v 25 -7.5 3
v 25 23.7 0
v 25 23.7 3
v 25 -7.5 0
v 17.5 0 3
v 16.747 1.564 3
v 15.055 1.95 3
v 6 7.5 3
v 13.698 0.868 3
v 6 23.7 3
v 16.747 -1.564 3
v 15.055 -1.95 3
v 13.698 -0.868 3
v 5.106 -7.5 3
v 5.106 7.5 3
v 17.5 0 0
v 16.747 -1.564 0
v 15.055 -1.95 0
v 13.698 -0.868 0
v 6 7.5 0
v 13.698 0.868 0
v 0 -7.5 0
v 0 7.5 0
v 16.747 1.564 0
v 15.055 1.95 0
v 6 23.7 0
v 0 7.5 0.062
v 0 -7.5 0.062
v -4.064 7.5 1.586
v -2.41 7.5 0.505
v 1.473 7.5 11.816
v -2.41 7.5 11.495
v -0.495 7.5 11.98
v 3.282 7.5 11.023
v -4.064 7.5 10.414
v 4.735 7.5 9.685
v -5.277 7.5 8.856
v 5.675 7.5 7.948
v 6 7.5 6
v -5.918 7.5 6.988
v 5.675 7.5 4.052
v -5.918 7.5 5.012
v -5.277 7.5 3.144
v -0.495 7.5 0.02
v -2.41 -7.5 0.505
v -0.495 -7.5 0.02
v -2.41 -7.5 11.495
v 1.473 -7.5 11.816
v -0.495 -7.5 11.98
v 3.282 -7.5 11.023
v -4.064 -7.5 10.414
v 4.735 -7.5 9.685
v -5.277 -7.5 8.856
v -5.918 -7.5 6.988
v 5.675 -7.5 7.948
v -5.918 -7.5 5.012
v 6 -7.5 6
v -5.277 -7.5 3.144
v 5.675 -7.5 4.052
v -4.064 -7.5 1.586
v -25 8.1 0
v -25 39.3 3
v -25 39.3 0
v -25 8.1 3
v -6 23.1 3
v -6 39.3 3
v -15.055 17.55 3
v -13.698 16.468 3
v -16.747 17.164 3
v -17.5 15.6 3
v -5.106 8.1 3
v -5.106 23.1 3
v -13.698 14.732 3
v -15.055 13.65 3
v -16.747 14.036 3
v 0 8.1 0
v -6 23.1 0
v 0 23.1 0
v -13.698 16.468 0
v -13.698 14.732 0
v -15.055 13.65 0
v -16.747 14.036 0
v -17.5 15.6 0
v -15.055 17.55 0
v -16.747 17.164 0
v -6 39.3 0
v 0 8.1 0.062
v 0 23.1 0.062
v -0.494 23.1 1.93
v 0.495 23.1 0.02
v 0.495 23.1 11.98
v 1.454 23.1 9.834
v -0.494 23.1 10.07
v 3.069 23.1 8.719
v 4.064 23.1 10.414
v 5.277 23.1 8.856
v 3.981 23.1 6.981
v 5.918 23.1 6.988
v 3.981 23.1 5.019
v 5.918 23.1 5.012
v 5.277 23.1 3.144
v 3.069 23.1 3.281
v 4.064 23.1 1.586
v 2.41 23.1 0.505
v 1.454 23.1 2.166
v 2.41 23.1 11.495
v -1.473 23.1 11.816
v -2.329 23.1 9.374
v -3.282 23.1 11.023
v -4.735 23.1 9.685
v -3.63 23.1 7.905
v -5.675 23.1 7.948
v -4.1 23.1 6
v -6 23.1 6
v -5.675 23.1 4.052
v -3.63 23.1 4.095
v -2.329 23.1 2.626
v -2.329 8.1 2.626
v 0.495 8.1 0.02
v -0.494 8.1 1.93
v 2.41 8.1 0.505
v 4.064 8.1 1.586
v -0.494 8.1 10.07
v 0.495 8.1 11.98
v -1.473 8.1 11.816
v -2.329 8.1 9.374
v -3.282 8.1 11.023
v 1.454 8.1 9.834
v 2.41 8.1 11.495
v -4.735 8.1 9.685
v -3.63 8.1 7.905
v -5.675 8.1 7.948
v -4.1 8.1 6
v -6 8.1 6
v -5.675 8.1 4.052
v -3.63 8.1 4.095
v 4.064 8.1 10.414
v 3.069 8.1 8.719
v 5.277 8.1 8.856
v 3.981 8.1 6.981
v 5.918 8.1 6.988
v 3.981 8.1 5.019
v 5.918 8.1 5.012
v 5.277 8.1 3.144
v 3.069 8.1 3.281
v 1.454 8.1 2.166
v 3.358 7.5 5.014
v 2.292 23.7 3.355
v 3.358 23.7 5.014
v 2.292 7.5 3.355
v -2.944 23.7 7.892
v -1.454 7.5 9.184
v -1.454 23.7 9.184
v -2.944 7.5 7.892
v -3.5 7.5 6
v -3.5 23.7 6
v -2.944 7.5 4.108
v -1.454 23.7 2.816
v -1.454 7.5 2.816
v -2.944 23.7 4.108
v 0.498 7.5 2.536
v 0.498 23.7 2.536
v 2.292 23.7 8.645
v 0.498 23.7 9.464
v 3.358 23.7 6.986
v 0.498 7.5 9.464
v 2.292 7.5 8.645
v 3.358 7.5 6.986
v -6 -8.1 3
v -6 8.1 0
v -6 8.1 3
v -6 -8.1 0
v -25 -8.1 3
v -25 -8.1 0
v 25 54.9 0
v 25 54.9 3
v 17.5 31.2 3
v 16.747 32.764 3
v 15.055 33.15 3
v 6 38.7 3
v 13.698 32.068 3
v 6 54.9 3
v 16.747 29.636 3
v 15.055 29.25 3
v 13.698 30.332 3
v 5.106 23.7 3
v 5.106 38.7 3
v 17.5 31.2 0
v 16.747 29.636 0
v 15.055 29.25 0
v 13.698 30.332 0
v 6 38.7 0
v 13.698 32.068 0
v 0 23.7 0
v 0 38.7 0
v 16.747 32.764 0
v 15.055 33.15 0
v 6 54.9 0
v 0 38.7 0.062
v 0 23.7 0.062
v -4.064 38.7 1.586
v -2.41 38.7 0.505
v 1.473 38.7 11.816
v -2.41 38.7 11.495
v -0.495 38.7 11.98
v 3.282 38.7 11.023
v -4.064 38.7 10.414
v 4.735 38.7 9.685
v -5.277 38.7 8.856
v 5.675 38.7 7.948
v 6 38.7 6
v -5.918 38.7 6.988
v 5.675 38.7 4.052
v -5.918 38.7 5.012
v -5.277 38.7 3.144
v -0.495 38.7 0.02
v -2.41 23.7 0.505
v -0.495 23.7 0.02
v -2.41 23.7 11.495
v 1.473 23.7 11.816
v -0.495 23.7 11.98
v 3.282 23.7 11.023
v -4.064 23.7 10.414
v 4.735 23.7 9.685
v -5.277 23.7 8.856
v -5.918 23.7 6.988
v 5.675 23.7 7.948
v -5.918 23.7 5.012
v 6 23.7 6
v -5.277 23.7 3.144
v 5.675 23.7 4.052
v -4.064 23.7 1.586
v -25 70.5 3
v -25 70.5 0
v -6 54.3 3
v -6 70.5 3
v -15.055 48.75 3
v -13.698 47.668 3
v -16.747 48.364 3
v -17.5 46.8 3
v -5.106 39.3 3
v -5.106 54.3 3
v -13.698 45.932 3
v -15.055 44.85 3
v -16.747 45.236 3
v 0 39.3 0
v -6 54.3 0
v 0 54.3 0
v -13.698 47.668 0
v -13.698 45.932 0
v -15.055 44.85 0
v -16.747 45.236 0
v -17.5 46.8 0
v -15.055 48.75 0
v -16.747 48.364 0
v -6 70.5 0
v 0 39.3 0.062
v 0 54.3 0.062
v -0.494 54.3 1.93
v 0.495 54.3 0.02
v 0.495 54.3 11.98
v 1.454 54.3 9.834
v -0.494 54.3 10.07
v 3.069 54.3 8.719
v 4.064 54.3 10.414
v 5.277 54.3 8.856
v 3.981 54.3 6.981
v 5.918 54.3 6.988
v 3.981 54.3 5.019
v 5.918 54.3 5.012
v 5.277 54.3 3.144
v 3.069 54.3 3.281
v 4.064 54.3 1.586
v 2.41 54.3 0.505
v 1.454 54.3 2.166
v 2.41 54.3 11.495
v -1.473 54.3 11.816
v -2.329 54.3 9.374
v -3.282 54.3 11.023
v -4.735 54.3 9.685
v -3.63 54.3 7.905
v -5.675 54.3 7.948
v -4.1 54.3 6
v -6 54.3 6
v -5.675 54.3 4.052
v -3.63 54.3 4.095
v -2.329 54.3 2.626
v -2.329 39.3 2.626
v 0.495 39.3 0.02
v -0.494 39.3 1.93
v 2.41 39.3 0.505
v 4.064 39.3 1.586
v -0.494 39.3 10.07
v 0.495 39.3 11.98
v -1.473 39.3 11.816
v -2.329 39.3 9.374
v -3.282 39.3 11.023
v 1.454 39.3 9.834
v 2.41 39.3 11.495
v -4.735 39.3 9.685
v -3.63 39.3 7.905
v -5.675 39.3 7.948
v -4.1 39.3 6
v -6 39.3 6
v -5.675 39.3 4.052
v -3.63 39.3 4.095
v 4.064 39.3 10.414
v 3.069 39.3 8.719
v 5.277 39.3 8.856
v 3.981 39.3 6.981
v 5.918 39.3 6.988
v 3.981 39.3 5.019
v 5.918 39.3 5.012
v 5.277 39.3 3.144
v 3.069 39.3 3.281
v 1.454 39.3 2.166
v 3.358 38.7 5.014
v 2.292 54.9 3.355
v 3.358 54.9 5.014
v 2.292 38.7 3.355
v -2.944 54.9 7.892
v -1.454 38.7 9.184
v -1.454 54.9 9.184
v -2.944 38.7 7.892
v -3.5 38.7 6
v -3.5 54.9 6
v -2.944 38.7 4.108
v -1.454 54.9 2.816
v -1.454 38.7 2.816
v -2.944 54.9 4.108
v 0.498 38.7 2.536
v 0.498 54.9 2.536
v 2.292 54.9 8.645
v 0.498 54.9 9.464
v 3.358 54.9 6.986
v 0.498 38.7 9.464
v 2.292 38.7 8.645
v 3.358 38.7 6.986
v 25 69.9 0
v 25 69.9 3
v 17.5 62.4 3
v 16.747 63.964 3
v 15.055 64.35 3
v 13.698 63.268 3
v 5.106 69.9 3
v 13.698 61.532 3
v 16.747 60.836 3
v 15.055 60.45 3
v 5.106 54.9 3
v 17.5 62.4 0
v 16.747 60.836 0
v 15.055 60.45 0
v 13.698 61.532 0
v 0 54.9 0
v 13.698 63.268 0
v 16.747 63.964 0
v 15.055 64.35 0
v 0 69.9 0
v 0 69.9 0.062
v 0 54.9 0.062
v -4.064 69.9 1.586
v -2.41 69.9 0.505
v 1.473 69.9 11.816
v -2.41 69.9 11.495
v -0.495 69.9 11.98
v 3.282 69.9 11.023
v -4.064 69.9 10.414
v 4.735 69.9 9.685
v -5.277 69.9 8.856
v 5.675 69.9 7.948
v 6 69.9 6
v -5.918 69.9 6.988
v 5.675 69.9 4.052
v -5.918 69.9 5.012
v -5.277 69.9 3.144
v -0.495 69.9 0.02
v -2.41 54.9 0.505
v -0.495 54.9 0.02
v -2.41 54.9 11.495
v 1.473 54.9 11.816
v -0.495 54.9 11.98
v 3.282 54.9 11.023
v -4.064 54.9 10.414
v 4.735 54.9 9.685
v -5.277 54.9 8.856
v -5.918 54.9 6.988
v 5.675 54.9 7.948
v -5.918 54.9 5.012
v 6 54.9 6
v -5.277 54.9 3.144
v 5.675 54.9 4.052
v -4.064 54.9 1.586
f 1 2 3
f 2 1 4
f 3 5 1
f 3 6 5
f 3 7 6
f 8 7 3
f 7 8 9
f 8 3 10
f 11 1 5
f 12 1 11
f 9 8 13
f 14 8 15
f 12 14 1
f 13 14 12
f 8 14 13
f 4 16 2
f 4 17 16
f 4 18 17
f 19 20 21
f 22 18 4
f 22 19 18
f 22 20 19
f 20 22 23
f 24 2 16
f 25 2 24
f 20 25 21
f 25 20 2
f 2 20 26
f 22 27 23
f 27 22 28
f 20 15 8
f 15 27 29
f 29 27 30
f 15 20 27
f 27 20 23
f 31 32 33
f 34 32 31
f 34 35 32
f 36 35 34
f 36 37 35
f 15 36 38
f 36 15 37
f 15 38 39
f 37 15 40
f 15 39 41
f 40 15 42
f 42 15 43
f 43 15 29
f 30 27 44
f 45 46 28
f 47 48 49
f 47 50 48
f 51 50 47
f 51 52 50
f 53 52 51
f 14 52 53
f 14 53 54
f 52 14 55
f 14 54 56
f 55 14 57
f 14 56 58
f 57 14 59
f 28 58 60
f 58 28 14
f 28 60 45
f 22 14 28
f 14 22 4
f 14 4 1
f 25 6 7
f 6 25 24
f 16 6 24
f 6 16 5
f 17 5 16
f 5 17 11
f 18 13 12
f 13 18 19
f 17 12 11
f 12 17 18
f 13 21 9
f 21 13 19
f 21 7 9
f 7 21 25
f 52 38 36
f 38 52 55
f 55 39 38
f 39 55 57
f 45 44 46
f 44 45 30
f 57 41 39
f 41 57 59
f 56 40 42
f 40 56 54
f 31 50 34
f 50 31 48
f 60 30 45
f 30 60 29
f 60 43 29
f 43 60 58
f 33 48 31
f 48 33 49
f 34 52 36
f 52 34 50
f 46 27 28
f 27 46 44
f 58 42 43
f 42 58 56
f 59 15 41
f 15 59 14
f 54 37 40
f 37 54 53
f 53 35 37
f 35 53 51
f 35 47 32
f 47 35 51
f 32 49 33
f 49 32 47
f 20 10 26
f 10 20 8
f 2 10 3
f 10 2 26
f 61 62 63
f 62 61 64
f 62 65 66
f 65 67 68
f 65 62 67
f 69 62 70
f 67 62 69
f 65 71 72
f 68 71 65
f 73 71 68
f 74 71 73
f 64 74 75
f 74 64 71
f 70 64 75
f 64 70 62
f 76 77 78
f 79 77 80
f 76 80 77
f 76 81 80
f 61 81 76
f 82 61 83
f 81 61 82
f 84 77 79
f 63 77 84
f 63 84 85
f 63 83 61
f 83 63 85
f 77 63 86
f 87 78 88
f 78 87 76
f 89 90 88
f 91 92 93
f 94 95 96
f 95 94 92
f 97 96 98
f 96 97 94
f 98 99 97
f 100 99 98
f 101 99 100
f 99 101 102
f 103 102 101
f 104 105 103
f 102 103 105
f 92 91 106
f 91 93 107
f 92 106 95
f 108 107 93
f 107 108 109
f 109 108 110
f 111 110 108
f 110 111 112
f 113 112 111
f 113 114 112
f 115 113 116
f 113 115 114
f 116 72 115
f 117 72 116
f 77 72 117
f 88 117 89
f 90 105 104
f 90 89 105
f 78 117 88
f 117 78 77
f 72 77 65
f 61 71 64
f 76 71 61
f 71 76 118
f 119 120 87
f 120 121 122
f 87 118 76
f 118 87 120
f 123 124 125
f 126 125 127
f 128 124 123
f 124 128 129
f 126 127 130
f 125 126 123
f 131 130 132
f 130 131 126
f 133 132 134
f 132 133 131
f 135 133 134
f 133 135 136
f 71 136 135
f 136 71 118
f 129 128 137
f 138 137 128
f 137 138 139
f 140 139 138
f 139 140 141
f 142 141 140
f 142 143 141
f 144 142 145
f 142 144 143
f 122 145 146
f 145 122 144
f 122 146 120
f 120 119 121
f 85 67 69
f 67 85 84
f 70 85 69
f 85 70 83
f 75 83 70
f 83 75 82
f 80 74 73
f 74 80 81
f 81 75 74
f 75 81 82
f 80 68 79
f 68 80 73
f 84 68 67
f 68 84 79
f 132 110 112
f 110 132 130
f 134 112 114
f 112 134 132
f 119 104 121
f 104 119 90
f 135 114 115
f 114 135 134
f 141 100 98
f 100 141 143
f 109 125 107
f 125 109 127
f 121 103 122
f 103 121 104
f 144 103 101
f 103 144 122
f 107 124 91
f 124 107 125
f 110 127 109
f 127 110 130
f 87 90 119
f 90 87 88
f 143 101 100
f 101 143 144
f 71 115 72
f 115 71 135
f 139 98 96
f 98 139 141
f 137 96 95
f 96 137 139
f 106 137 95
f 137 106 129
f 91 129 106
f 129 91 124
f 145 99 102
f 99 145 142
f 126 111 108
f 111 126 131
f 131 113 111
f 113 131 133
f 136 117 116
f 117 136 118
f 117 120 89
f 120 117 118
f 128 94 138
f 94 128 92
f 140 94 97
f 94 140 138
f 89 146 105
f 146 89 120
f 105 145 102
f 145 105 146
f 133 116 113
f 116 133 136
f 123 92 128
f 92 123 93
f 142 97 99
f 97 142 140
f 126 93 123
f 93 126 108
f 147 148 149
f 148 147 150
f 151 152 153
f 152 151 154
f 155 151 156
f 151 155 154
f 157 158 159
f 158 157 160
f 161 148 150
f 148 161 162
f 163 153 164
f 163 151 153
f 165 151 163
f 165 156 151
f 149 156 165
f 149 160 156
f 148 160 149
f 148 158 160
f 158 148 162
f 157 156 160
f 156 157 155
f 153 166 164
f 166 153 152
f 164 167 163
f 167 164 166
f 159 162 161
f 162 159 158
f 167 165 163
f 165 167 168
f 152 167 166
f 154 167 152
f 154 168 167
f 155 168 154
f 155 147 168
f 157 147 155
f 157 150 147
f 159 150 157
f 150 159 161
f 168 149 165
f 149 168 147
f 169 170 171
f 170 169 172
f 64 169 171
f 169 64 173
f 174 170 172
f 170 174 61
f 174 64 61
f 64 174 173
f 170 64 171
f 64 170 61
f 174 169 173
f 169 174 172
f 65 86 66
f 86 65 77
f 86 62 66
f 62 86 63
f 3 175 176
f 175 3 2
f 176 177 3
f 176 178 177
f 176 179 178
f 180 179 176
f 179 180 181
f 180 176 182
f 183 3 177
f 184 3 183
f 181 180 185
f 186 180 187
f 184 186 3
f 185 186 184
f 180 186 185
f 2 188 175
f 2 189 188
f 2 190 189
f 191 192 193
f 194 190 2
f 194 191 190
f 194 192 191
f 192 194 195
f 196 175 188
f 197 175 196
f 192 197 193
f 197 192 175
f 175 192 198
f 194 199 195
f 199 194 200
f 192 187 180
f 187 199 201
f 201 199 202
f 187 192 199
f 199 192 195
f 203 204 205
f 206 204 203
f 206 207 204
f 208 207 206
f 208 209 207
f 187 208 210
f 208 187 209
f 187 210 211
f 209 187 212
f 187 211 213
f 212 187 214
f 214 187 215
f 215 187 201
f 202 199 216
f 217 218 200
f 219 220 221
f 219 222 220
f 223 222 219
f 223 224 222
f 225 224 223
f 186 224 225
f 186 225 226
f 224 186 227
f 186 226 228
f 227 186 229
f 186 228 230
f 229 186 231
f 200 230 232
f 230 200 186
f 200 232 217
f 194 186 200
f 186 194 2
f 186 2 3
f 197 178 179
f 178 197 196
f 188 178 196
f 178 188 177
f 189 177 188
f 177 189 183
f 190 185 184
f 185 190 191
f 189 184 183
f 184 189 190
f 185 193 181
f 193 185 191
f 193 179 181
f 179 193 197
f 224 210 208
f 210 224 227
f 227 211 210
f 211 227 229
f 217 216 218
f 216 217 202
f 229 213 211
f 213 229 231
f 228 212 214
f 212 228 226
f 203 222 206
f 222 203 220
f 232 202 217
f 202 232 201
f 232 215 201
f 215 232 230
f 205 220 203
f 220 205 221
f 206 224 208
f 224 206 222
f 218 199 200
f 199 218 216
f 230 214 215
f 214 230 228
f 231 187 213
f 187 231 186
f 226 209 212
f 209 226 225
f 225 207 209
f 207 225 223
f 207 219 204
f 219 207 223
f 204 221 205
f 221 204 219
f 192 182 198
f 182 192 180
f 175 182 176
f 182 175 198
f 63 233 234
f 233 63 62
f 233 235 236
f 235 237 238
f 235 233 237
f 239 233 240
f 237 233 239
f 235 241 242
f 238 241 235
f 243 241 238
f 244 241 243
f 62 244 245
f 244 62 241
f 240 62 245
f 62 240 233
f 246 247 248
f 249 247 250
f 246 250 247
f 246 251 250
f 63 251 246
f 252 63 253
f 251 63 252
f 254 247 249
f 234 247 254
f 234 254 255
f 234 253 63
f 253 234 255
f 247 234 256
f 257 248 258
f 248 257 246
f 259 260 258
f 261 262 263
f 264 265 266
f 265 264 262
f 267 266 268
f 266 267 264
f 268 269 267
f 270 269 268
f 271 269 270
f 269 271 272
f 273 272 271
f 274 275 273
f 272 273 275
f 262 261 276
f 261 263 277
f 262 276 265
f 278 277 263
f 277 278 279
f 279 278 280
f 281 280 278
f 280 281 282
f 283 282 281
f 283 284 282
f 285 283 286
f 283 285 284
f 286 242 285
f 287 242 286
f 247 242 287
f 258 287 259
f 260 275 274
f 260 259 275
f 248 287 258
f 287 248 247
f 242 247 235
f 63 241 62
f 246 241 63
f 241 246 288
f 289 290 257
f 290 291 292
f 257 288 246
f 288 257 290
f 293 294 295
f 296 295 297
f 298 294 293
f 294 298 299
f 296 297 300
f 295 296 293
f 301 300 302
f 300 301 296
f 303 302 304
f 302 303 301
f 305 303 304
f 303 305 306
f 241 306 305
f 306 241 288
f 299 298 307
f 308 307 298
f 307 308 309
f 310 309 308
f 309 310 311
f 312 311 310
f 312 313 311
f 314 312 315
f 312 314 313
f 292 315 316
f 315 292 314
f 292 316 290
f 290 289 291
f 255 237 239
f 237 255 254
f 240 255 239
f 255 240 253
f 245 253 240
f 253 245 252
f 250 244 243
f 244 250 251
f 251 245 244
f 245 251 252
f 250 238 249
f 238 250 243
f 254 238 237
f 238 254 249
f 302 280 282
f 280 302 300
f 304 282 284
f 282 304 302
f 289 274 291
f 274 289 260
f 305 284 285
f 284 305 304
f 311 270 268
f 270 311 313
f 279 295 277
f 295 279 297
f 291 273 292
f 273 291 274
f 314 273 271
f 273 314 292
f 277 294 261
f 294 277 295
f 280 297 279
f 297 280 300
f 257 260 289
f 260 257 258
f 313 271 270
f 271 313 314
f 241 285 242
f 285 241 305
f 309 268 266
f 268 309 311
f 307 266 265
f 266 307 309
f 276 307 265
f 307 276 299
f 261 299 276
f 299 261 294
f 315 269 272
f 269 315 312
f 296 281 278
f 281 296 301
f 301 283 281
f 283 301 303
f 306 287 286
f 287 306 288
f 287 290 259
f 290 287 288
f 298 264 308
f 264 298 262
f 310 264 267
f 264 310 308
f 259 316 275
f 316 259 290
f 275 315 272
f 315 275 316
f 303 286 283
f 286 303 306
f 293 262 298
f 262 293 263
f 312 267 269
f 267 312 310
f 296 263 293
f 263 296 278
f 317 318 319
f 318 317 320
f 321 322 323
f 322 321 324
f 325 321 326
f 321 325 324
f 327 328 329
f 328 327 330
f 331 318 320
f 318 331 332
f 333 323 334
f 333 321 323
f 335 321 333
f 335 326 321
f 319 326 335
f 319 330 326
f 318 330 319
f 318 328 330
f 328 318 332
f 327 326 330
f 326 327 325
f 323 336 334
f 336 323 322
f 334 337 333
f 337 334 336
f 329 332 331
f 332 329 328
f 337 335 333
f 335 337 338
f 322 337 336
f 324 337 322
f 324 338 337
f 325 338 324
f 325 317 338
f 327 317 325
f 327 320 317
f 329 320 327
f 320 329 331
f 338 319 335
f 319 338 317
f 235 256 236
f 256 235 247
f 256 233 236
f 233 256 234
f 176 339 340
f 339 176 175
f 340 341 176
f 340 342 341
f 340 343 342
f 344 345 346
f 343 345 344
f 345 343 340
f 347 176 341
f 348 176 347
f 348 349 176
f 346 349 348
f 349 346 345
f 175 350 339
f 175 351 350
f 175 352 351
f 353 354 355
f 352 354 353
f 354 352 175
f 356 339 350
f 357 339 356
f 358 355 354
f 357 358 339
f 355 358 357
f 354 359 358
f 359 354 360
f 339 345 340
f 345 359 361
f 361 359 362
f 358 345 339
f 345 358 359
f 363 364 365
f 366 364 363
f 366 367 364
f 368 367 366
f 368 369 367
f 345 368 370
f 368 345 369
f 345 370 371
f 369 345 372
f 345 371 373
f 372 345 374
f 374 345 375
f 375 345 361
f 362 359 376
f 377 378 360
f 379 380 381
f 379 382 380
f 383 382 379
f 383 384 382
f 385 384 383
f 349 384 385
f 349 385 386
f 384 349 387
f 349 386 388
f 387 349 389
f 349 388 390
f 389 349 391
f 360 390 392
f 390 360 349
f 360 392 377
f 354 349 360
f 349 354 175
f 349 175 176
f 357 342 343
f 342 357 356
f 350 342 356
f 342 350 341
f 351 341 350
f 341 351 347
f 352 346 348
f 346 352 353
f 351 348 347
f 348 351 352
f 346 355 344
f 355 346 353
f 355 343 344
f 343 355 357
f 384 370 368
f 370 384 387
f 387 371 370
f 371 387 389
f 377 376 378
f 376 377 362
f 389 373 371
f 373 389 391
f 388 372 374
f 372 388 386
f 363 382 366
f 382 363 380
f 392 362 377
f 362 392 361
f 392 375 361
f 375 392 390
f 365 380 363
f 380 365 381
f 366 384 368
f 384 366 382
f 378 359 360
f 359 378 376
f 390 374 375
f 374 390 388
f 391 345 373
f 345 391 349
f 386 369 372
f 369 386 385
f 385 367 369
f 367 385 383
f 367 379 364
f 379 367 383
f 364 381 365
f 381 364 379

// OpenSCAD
/*[Link]*/
LinkRadius = 6;
//This is the length of each link, consider that this is the distance that your printer needs to be able to bridge.
LinkLength = 15;
//The thicker, the sturdier the overall hinge. Obiously InnerShaft + Inner Tolerance should never be bigger than Link Radius.
InnerShaft = 3.5;
//Depends on your printer/material, .6 worked well for me (this is the distance between the inner shaft and the inner layers of the links)
InnerTolerance = .6;
//Spacing between the links, i found .6mm to give good results
Spacing = .6;
//LinkNumber * LinkLength = the total length of your hinge.
LinkNumber = 5;
/*[Tabs]*/
TabLength0 = 25;
TabLength = 25;
TabThickness = 3;
HoleDiameter=4;
HoleOffset0=0;
HoleOffset=0;
//Do you want 2 long tabs or multiple smaller ones? 0=Yes, 1=No
LongTab = 0;

TotalLength = (LinkNumber*LinkLength)+(Spacing*(LinkNumber-1));


module solidHinge(LinkRadius,LinkLength,TabLength,TabThickness){
    union(){
        rotate([90,0,0]) linear_extrude(height=LinkLength,center=true) translate([0,LinkRadius,0]) circle(LinkRadius);
        translate([TabLength/2,0,TabThickness/2]) 
        difference(){cube([TabLength,LinkLength,TabThickness],center=true);
            translate([LinkRadius/2+HoleOffset,0,0])cylinder(h=TabThickness,r=HoleDiameter/2,center=true);
        }
    }
}


module hollowHinge(LinkRadius,LinkLength,TabLength,TabThickness,Spacing,InnerTolerance,InnerShaft){
    union(){
        difference(){
            union(){
                rotate([90,0,0]) linear_extrude(height=LinkLength,center=true) translate([0,LinkRadius,0]) circle(LinkRadius);
                translate([TabLength0/2,0,TabThickness/2]) 
                difference(){cube([TabLength0,LinkLength,TabThickness],center=true);
                translate([LinkRadius/2+HoleOffset0,0,0])cylinder(h=TabThickness,r=HoleDiameter/2,center=true);
                }
            }
            rotate([90,0,0]) linear_extrude(height=LinkLength+Spacing,center=true) translate([0,LinkRadius,0]) circle(InnerShaft+InnerTolerance,center=true);
        }
        rotate([90,0,0]) linear_extrude(height=LinkLength+(Spacing*2),center=true) translate([0,LinkRadius,0]) circle(InnerShaft,center=true);
    }
}

module CompleteHinge(LinkRadius,LinkLength,TabLength,TabThickness,Spacing,InnerTolerance,InnerShaft,LongTab,LinkNumber){
    
    union(){
        for(a=[0:LinkNumber-1]){
            if(a%2!=0){
                union(){
                mirror(1,0,0) translate([0,(LinkLength+(Spacing))*a,0]) hollowHinge(LinkRadius,LinkLength,TabLength,TabThickness,Spacing,InnerTolerance,InnerShaft); 
                   if(LongTab==0 && a!=LinkNumber-1){
                       if(a==1){
                       translate([-TabLength0/2-LinkRadius/2,0,TabThickness/2]) cube([TabLength0-LinkRadius,LinkLength+(Spacing*2),TabThickness],center=true);
                       }
                    translate([-TabLength0/2-LinkRadius/2,(LinkLength+(Spacing))*(a+1),TabThickness/2]) cube([TabLength0-LinkRadius,LinkLength+(Spacing*2),TabThickness],center=true); }
                } 
            }
            else{
                union(){
                translate([0,(LinkLength+(Spacing))*a,0]) solidHinge(LinkRadius,LinkLength,TabLength,TabThickness);
                    if(LongTab==0 && a!=LinkNumber-1){
                    translate([TabLength/2+LinkRadius/2,(LinkLength+(Spacing))*(a+1),TabThickness/2]) cube([TabLength-LinkRadius,LinkLength+(Spacing*2),TabThickness],center=true); }
                }             
            }
            if(LinkNumber%2==0){
                if(a==LinkNumber-1){
                    translate([0,((LinkLength+(Spacing))*a)+(LinkLength/2)+Spacing+(LinkLength/20),0]) rotate([90,0,0]) linear_extrude(height=LinkLength/10,center=true) translate([0,LinkRadius,0]) circle(LinkRadius); 
                }
            }
        }
        /*if(LongTab==0){
            color("blue",1) translate([(TabLength+LinkRadius)/2,(TotalLength/2)-(LinkLength/2)]) linear_extrude(height=TabThickness)square([(TabLength-LinkRadius),TotalLength],center=true);                
            color("blue",1) color("blue",1) translate([-(TabLength0+LinkRadius)/2,(TotalLength/2)-(LinkLength/2)]) linear_extrude(height=TabThickness)square([(TabLength0-LinkRadius),TotalLength],center=true);
        }*/
    }
    
}

CompleteHinge(LinkRadius,LinkLength,TabLength,TabThickness,Spacing,InnerTolerance,InnerShaft,LongTab,LinkNumber);
//hollowHinge(LinkRadius,LinkLength,TabLength,TabThickness,Spacing,InnerTolerance,InnerShaft);
